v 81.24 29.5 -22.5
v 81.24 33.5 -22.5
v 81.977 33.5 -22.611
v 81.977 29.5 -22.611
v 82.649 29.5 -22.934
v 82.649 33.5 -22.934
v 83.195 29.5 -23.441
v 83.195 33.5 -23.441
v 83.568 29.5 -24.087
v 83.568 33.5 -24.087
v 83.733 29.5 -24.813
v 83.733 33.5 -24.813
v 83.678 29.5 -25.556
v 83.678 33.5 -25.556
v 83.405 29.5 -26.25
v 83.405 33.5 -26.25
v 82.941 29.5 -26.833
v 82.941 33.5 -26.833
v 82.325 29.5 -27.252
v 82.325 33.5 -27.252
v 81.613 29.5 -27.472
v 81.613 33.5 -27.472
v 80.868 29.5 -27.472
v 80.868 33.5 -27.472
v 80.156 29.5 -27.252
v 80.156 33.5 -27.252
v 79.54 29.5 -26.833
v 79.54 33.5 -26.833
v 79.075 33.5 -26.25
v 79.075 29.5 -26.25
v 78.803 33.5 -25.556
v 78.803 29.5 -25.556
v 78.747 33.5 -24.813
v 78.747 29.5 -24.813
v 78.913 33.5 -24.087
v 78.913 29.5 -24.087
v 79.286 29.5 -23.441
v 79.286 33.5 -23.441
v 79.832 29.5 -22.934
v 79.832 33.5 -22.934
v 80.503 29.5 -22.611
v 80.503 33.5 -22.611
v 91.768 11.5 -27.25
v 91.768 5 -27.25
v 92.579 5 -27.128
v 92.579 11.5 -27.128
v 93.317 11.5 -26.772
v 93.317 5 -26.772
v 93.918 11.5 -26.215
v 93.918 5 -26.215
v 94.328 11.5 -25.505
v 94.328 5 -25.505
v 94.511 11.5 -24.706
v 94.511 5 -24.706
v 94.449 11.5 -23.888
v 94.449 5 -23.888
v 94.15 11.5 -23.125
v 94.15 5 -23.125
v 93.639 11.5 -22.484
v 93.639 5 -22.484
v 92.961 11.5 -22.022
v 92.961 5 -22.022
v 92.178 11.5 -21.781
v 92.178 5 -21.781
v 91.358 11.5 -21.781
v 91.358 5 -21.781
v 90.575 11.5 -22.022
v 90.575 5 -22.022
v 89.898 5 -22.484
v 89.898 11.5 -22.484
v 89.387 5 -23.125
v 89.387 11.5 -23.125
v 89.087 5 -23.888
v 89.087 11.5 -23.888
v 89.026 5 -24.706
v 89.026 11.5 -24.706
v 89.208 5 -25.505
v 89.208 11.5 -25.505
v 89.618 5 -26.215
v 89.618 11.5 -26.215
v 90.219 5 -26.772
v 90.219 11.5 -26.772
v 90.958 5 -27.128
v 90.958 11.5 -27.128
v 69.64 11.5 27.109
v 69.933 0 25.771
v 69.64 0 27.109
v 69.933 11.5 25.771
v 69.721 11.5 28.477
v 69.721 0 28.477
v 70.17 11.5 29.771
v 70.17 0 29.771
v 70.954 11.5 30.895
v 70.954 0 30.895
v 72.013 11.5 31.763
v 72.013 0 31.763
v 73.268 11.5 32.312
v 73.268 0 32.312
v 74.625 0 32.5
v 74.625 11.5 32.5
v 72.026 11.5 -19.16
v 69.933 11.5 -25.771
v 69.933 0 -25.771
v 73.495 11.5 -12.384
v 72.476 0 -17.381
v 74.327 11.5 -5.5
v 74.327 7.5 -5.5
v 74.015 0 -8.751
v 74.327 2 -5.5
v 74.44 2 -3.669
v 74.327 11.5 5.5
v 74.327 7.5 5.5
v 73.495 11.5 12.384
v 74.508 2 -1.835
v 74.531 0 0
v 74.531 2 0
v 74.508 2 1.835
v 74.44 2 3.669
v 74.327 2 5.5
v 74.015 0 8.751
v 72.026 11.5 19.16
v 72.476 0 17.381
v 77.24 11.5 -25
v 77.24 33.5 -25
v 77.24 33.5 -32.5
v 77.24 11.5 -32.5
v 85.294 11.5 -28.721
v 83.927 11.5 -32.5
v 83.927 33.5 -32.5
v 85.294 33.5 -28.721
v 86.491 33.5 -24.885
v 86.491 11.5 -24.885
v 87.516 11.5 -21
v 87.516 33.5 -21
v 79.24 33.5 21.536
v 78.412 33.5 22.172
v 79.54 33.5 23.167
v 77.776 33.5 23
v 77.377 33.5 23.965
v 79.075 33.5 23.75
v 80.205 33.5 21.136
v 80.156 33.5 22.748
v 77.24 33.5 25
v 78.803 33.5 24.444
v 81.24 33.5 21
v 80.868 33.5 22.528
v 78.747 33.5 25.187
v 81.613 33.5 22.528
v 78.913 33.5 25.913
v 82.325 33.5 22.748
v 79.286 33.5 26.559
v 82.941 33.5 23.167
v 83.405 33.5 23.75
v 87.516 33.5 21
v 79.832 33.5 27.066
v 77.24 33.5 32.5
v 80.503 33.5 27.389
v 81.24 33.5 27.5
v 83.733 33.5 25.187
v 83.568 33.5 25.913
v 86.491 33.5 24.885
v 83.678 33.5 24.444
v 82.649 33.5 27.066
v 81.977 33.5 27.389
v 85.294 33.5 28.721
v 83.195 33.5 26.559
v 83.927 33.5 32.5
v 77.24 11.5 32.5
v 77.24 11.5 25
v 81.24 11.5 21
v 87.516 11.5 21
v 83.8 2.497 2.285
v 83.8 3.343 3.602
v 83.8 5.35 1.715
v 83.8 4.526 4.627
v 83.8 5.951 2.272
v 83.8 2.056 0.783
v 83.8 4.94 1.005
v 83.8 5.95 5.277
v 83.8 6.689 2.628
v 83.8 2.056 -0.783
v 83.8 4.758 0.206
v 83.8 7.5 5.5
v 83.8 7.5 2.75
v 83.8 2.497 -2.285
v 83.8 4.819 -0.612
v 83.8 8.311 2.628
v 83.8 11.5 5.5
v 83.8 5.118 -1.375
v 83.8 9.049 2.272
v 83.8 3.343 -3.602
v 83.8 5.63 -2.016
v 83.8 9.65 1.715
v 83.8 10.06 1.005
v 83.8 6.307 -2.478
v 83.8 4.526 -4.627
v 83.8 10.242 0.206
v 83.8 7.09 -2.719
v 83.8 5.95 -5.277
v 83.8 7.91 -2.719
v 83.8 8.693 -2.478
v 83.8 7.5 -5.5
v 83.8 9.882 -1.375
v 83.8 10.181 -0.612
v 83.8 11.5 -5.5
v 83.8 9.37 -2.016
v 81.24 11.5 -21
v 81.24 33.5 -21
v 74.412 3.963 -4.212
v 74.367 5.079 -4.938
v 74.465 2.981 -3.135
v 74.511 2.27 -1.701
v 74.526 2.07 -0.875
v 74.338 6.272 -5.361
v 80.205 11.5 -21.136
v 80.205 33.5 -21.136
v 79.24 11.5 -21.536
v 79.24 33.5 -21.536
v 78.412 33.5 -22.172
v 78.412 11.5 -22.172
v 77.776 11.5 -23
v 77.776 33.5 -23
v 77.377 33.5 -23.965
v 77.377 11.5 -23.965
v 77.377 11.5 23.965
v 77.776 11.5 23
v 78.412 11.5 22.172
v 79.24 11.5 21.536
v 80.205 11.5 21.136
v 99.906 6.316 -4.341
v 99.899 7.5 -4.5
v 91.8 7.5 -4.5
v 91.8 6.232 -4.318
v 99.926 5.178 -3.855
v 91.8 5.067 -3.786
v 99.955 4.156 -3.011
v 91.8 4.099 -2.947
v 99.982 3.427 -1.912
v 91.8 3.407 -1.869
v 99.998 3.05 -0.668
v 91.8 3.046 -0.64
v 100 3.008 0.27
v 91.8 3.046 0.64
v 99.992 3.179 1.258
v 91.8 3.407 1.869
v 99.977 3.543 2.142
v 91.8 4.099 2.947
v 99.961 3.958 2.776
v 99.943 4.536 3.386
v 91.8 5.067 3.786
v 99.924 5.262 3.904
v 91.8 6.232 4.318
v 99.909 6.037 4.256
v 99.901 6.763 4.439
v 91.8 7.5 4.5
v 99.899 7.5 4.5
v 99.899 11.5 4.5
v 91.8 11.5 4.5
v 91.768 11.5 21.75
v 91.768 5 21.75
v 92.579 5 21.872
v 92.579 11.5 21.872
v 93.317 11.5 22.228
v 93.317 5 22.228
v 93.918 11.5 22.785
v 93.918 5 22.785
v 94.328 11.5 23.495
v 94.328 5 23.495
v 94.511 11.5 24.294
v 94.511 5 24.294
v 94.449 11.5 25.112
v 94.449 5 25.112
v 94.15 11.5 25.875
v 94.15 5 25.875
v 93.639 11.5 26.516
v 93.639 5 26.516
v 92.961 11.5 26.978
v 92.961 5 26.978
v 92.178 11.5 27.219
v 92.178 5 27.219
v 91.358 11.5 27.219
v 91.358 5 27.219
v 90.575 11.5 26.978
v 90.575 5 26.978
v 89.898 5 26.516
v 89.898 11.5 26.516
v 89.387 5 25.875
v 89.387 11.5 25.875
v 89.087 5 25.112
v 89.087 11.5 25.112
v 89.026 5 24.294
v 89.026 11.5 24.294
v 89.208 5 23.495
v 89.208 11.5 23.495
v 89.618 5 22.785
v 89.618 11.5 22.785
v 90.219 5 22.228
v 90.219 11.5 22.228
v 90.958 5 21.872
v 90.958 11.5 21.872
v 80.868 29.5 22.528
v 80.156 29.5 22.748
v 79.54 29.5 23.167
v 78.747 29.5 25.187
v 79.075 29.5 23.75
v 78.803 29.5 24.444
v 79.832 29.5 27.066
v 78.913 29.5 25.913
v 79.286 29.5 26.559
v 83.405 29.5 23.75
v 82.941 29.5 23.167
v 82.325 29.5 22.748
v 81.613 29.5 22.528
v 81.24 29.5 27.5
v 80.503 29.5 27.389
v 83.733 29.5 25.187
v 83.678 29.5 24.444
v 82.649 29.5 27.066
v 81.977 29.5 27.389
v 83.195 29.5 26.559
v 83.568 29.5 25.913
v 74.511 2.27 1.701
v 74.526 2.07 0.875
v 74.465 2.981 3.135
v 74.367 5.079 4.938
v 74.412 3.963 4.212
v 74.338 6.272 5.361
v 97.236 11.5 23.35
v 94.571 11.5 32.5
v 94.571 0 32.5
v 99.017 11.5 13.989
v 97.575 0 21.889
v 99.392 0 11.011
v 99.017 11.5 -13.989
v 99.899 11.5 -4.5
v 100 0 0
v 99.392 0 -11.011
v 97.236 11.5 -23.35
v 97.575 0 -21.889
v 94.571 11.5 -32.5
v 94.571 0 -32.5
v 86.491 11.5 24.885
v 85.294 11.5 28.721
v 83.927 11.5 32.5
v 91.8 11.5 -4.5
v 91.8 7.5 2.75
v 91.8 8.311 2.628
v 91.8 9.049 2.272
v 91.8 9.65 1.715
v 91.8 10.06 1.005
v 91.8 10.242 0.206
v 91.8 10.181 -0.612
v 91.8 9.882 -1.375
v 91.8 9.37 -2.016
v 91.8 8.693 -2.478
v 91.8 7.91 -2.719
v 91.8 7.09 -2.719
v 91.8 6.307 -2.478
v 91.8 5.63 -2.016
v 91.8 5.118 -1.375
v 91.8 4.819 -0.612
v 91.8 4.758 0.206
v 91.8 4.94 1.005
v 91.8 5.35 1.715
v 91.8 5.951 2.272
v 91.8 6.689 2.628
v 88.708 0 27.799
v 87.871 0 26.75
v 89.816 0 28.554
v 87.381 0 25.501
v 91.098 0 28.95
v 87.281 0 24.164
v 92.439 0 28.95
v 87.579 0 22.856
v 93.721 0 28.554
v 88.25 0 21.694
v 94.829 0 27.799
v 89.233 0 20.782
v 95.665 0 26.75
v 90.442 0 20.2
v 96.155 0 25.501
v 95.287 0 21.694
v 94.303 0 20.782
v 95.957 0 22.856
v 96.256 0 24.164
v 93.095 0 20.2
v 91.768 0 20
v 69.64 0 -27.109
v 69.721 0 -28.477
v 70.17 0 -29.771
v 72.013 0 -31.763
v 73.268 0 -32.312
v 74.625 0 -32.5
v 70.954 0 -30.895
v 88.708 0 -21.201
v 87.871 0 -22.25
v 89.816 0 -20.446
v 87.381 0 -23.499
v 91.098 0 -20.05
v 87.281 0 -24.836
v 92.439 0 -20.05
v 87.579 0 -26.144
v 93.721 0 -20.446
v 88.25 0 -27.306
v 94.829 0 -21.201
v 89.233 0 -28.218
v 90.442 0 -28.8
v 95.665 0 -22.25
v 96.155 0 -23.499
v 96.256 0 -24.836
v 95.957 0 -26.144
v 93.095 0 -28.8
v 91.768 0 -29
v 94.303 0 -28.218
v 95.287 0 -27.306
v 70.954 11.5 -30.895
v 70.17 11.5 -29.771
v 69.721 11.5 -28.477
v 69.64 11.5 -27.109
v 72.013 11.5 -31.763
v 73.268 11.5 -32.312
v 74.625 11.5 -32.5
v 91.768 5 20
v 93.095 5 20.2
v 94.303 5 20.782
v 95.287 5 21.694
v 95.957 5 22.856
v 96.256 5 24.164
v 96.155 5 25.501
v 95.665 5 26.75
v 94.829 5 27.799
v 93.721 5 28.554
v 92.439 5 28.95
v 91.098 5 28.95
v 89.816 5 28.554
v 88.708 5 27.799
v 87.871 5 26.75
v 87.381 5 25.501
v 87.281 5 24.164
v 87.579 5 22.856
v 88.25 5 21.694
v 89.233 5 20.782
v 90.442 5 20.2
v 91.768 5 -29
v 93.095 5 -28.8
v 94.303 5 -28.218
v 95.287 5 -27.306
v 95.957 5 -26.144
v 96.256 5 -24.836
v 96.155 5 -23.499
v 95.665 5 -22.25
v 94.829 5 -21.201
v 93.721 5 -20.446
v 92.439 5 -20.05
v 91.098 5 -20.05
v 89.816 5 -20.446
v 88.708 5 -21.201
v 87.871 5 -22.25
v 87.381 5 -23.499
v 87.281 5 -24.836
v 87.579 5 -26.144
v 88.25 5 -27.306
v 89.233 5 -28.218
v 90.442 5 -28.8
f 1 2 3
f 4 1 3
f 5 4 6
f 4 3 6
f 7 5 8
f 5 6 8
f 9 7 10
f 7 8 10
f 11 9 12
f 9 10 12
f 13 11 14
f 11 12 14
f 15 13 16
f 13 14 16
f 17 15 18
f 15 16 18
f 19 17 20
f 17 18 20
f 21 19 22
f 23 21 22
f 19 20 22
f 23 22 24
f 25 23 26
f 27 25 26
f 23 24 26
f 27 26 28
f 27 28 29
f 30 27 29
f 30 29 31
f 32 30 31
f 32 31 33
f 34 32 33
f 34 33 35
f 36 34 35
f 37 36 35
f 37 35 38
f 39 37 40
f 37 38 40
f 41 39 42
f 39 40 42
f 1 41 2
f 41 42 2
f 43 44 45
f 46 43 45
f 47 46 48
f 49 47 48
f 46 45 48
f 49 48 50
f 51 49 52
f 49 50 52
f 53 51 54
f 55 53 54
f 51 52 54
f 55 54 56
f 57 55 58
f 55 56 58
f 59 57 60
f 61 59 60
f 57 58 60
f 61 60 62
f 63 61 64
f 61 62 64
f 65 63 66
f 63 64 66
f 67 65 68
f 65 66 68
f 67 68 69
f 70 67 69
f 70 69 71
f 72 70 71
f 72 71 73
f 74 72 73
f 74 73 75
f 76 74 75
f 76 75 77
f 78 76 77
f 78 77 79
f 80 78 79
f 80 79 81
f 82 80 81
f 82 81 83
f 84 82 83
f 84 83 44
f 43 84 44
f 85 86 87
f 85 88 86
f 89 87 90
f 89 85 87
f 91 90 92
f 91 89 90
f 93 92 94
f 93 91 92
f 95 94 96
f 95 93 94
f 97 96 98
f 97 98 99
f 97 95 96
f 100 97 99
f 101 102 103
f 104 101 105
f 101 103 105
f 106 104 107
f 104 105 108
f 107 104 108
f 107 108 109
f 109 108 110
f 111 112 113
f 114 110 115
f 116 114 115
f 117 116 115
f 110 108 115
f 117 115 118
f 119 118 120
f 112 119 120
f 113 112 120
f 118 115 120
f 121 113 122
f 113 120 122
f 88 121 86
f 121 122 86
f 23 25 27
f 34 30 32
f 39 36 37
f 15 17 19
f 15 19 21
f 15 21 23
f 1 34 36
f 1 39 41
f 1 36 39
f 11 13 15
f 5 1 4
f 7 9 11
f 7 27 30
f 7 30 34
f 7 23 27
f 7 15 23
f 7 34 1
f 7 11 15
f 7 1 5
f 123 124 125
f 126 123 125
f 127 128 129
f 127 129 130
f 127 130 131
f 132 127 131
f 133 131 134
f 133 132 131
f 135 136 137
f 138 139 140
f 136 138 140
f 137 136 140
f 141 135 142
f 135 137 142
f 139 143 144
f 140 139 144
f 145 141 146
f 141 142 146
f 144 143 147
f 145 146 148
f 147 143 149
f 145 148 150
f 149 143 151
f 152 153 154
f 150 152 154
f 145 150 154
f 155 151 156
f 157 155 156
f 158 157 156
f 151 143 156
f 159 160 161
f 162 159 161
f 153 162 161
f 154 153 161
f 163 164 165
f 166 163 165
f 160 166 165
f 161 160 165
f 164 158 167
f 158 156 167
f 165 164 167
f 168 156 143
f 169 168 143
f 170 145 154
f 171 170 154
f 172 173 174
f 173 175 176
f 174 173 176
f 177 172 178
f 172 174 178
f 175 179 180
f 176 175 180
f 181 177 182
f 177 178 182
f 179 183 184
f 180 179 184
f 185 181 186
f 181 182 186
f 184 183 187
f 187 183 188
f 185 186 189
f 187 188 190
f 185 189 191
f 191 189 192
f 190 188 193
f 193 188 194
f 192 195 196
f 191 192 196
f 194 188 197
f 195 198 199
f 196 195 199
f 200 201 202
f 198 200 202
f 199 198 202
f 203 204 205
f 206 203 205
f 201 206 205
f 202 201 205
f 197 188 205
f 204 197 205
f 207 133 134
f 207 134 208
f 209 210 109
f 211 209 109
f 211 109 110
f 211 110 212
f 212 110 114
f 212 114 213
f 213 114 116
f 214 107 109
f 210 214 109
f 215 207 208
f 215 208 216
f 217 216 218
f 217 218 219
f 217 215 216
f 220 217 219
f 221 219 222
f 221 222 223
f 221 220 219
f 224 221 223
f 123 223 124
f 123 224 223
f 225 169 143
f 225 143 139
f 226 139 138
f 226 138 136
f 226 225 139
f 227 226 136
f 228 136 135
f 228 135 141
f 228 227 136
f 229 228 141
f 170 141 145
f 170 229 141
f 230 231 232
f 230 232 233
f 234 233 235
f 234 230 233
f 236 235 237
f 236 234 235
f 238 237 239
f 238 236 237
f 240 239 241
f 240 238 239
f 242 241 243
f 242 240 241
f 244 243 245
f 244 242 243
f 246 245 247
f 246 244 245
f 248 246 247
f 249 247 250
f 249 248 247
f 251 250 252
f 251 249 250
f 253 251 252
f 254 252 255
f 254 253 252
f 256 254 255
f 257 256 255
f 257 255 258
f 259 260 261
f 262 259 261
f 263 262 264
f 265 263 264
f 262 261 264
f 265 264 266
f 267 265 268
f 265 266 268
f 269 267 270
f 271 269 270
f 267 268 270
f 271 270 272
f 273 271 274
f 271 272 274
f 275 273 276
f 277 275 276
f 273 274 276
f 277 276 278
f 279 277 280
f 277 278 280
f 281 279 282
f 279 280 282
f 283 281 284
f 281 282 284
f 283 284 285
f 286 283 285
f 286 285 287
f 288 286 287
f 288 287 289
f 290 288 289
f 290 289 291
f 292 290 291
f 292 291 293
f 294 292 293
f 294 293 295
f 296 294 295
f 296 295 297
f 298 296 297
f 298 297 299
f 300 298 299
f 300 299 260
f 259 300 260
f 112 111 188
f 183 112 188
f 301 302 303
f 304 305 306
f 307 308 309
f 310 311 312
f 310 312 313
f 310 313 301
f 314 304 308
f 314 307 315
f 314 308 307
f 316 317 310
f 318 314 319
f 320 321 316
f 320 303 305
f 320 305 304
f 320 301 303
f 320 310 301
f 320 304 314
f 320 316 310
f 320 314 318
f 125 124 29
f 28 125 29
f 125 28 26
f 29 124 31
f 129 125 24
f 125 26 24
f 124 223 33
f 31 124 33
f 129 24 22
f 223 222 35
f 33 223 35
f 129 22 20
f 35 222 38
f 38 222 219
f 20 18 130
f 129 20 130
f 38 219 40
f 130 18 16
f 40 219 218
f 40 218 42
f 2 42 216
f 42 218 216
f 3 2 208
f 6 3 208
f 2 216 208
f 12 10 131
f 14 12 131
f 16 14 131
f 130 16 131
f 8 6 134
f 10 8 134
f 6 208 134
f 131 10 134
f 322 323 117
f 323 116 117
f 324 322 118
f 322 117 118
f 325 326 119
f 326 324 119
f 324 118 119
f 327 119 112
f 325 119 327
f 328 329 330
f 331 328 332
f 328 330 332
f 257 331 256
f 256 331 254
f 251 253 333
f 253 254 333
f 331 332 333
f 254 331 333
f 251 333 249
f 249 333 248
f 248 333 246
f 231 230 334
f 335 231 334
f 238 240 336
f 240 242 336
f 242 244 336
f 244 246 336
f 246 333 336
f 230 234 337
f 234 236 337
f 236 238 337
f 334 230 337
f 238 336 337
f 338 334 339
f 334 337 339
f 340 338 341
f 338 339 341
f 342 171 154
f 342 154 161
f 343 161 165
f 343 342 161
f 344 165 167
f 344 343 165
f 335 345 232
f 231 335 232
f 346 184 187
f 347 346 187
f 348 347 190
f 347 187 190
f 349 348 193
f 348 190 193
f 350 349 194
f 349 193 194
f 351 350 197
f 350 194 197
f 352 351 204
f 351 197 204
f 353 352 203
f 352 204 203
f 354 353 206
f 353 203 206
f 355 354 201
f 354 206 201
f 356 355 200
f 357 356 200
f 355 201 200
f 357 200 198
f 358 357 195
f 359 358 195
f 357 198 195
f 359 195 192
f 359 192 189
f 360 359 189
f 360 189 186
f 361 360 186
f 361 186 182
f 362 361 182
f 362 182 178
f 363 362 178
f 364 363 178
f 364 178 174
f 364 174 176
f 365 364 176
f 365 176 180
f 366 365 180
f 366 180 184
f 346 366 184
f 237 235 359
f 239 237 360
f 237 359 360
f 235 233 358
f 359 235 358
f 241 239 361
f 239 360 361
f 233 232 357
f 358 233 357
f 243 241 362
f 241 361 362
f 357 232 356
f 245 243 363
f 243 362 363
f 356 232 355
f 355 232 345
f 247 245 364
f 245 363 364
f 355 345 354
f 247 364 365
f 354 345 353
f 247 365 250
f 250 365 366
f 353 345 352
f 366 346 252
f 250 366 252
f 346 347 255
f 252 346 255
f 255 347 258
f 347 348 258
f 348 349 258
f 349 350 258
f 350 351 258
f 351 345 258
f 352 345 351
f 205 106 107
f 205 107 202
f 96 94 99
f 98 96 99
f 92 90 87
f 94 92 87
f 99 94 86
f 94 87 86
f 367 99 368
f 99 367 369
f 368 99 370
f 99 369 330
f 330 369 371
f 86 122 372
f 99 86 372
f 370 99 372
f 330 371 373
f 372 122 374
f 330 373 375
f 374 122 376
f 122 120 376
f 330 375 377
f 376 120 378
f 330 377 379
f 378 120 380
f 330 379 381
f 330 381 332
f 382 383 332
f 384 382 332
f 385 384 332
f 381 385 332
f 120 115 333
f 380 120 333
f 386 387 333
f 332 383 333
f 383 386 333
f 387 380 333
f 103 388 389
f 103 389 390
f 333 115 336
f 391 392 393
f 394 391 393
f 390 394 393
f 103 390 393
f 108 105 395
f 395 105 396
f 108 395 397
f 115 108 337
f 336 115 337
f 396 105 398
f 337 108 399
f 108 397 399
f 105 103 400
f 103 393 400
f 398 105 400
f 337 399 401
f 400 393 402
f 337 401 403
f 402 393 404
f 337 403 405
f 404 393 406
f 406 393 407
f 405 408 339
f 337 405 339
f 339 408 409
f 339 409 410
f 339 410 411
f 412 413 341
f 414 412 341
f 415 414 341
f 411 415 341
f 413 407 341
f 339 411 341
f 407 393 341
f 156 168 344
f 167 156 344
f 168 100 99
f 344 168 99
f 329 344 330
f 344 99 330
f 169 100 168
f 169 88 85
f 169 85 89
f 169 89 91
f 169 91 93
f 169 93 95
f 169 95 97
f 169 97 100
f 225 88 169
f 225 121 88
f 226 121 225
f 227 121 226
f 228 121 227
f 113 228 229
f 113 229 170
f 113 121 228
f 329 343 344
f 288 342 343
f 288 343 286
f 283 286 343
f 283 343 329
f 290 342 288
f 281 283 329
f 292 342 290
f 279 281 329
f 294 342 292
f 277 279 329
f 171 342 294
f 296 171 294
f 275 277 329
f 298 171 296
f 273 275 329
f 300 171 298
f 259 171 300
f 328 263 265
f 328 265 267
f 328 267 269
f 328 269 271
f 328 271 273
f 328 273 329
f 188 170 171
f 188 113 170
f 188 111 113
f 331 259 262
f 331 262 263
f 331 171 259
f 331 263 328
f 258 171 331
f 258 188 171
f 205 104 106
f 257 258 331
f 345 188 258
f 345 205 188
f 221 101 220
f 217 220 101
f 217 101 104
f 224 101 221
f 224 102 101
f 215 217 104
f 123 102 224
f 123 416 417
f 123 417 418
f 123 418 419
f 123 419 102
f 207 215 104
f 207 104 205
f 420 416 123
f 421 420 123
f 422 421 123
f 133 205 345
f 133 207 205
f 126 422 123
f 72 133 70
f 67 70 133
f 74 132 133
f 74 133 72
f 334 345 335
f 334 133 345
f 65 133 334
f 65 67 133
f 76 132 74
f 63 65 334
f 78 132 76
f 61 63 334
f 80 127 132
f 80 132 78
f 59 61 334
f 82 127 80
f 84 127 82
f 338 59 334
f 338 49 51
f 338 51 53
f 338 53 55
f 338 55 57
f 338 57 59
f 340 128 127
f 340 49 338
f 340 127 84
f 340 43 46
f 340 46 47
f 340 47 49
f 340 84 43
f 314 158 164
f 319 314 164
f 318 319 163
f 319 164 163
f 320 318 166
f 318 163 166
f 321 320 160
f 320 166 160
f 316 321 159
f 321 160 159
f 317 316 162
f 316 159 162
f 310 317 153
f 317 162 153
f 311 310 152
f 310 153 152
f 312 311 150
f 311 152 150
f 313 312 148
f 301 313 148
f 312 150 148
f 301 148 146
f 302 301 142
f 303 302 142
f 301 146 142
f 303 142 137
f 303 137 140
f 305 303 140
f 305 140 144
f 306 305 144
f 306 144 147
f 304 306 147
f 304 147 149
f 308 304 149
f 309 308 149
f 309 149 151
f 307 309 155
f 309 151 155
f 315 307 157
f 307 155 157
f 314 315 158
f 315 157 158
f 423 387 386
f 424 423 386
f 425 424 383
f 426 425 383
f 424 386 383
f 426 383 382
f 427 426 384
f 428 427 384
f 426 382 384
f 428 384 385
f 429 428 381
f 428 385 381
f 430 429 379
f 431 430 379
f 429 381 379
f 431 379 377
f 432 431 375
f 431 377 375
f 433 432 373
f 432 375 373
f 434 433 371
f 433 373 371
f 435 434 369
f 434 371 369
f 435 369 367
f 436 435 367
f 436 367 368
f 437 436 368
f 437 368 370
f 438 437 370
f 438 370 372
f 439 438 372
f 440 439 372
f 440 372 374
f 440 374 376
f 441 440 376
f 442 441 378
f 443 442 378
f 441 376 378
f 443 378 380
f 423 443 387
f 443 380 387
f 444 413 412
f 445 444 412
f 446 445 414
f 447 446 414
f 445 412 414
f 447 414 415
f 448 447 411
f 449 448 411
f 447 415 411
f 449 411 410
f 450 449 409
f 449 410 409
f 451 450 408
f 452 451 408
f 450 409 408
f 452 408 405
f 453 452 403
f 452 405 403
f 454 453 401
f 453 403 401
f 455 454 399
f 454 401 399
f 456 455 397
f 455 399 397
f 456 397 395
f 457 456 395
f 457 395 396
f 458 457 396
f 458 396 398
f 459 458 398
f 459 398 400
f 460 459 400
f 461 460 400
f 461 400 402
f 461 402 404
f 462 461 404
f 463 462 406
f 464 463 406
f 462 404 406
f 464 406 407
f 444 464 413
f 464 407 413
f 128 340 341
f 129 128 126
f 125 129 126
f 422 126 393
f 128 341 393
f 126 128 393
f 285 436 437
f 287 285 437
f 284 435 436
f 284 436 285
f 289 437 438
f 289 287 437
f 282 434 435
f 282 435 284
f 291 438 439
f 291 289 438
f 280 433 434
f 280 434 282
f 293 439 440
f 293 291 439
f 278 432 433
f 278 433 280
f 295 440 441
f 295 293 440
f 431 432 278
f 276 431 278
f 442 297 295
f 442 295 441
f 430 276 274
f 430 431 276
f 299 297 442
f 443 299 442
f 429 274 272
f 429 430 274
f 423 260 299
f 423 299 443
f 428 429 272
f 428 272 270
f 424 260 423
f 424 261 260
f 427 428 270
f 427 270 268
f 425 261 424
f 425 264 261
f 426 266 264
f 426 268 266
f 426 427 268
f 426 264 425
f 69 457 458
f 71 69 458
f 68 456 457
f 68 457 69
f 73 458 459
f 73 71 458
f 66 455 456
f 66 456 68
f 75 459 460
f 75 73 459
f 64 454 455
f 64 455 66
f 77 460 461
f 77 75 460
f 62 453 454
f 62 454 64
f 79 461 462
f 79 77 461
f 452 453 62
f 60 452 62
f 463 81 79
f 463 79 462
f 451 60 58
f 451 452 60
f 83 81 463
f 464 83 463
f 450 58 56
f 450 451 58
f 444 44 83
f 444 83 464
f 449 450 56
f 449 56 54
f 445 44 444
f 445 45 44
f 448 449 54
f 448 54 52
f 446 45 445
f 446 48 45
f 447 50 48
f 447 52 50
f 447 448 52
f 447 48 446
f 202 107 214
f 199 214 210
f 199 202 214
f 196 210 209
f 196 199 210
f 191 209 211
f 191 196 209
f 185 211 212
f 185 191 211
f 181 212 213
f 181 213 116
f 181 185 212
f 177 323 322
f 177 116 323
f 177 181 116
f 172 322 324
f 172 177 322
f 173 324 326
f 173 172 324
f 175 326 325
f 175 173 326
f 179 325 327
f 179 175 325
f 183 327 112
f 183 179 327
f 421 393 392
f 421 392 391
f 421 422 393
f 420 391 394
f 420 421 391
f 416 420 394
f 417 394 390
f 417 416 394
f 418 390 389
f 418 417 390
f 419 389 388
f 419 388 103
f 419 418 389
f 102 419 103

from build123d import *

# Parameters (mm, degrees)
BOSS_EXTRUDE1_DEPTH = 11.5
BOSS_EXTRUDE2_DEPTH = 22
SKETCH3_R           = 2.5
CUT_EXTRUDE1_DEPTH  = 4
SKETCH4_R           = 4.5
CUT_EXTRUDE2_DEPTH  = 5
SKETCH5_R           = 2.75
CUT_EXTRUDE3_DEPTH  = 109.942645461
SKETCH6_R           = 2.75
CUT_EXTRUDE4_DEPTH  = 58.120859524
CUT_EXTRUDE5_DEPTH  = 8.2
SKETCH7_W           = 12
SKETCH7_H           = 11
CUT_EXTRUDE6_DEPTH  = 9.5
FILLET1_R           = 5.5
FILLET2_R           = 5


with BuildPart() as part:
    # Sketch1 → Boss-Extrude1 (new body)
    with BuildSketch(Plane(origin=(0, 0, 0), x_dir=(1, 0, 0), z_dir=(0, 1, 0))):
        with BuildLine():
            Line((67.071401597, -32.5), (94.571401597, -32.5))
            ThreePointArc((94.571401597, -32.5), (100, 0), (94.571401597, 32.5))
            Line((94.571401597, 32.5), (67.071401597, 32.5))
            ThreePointArc((67.071401597, 32.5), (74.530684367, 0), (67.071401597, -32.5))
        make_face()
    extrude(amount=BOSS_EXTRUDE1_DEPTH)

    # Sketch2 → Boss-Extrude2 (add)
    with BuildSketch(Plane.XZ.offset(-11.5)):
        with BuildLine():
            Line((81.240384046, 21), (87.515712875, 21))
            ThreePointArc((87.515712875, 21), (85.914014443, 26.810112315), (83.927051658, 32.5))
            Line((83.927051658, 32.5), (77.240384046, 32.5))
            Line((77.240384046, 32.5), (77.240384046, 25))
            ThreePointArc((77.240384046, 25), (78.411956922, 22.171572875), (81.240384046, 21))
        make_face()
        with BuildLine():
            Line((77.240384046, -25), (77.240384046, -32.5))
            Line((77.240384046, -32.5), (83.927051658, -32.5))
            ThreePointArc((83.927051658, -32.5), (85.914014443, -26.810112315), (87.515712875, -21))
            Line((87.515712875, -21), (81.240384046, -21))
            ThreePointArc((81.240384046, -21), (78.411956922, -22.171572875), (77.240384046, -25))
        make_face()
    extrude(amount=-BOSS_EXTRUDE2_DEPTH)

    # Sketch3 → Cut-Extrude1 (cut)
    with BuildSketch(Plane(origin=(0, 33.5, 0), x_dir=(1, 0, 0), z_dir=(0, 1, 0))):
        with Locations(Location((81.240384046, 25, 0), (0, 0, 270))):
            Circle(SKETCH3_R)
        with Locations(Location((81.240384046, -25, 0), (0, 0, 270))):
            Circle(SKETCH3_R)
    extrude(amount=-CUT_EXTRUDE1_DEPTH, mode=Mode.SUBTRACT)

    # Sketch4 → Cut-Extrude2 (cut)
    with BuildSketch(Plane.XZ):
        with Locations(Location((91.768319444, 24.5, 0), (0, 0, 270))):
            Circle(SKETCH4_R)
        with Locations(Location((91.768319444, -24.5, 0), (0, 0, 270))):
            Circle(SKETCH4_R)
    extrude(amount=-CUT_EXTRUDE2_DEPTH, mode=Mode.SUBTRACT)

    # Sketch5 → Cut-Extrude3 (cut, through all)
    with BuildSketch(Plane.XZ.offset(-5)):
        with Locations(Location((91.768319444, 24.5, 0), (0, 0, 270))):
            Circle(SKETCH5_R)
        with Locations(Location((91.768319444, -24.5, 0), (0, 0, 270))):
            Circle(SKETCH5_R)
    extrude(amount=-CUT_EXTRUDE3_DEPTH, mode=Mode.SUBTRACT)

    # Sketch6 → Cut-Extrude4 (cut, through all)
    with BuildSketch(Plane.ZY.offset(-67.071401597)):
        with Locations((0, 7.5)):
            Circle(SKETCH6_R)
    extrude(amount=-CUT_EXTRUDE4_DEPTH, mode=Mode.SUBTRACT)

    # Sketch8 → Cut-Extrude5 (cut)
    with BuildSketch(Plane(origin=(100, 0, 0), x_dir=(0, 0, -1), z_dir=(1, 0, 0))):
        with BuildLine():
            Line((-4.5, 7.5), (-4.5, 11.5))
            Line((-4.5, 11.5), (4.5, 11.5))
            Line((4.5, 11.5), (4.5, 7.5))
            ThreePointArc((4.5, 7.5), (0, 3), (-4.5, 7.5))
        make_face()
    extrude(amount=-CUT_EXTRUDE5_DEPTH, mode=Mode.SUBTRACT)

    # Sketch7 → Cut-Extrude6 (cut)
    with BuildSketch(Plane(origin=(0, 11.5, 0), x_dir=(1, 0, 0), z_dir=(0, 1, 0))):
        with Locations((77.8, 0)):
            Rectangle(SKETCH7_W, SKETCH7_H)
    extrude(amount=-CUT_EXTRUDE6_DEPTH, mode=Mode.SUBTRACT)

    # Fillet1
    # the kernel refuses this fillet: 5.5 mm, written as the material it adds along each edge
    with BuildSketch(Plane(origin=(60.577470777, 2, 5.5), x_dir=(0, 1, 0), z_dir=(1, 0, 0))) as fillet1_piece_1_section:
        with BuildLine():
            CenterArc((FILLET1_R, -FILLET1_R), FILLET1_R, 90, 90)
            Line((0, -FILLET1_R), (0, 0))
            Line((0, 0), (FILLET1_R, 0))
        make_face()
    fillet1_piece_1 = extrude(amount=36.972529223, mode=Mode.PRIVATE)
    fillet1_piece_1 = fillet1_piece_1 - Plane(origin=(0, 3.249781121, 0), x_dir=(0.899916620473715, 0, -0.43606200957566527), z_dir=(0, -1, 0)) * Cylinder(74.530684367, 96, mode=Mode.PRIVATE)
    add(fillet1_piece_1)
    with BuildSketch(Plane(origin=(97.55, 2, -5.5), x_dir=(0, 0, 1), z_dir=(-1, 0, 0))) as fillet1_piece_2_section:
        with BuildLine():
            CenterArc((FILLET1_R, FILLET1_R), FILLET1_R, 180, 90)
            Line((0, FILLET1_R), (0, 0))
            Line((0, 0), (FILLET1_R, 0))
        make_face()
    fillet1_piece_2 = extrude(amount=36.972529223, mode=Mode.PRIVATE)
    fillet1_piece_2 = fillet1_piece_2 - Plane(origin=(0, 3.245173128, 0), x_dir=(0.899916620473715, 0, -0.43606200957566527), z_dir=(0, -1, 0)) * Cylinder(74.530684367, 96, mode=Mode.PRIVATE)
    add(fillet1_piece_2)

    # Fillet2
    fillet2_edges = [part.edges().sort_by_distance(p)[0] for p in [
        (67.071401597, 5.75, 32.5),
        (67.071401597, 5.75, -32.5),
    ]]
    fillet(fillet2_edges, radius=FILLET2_R)


solid = part.part
